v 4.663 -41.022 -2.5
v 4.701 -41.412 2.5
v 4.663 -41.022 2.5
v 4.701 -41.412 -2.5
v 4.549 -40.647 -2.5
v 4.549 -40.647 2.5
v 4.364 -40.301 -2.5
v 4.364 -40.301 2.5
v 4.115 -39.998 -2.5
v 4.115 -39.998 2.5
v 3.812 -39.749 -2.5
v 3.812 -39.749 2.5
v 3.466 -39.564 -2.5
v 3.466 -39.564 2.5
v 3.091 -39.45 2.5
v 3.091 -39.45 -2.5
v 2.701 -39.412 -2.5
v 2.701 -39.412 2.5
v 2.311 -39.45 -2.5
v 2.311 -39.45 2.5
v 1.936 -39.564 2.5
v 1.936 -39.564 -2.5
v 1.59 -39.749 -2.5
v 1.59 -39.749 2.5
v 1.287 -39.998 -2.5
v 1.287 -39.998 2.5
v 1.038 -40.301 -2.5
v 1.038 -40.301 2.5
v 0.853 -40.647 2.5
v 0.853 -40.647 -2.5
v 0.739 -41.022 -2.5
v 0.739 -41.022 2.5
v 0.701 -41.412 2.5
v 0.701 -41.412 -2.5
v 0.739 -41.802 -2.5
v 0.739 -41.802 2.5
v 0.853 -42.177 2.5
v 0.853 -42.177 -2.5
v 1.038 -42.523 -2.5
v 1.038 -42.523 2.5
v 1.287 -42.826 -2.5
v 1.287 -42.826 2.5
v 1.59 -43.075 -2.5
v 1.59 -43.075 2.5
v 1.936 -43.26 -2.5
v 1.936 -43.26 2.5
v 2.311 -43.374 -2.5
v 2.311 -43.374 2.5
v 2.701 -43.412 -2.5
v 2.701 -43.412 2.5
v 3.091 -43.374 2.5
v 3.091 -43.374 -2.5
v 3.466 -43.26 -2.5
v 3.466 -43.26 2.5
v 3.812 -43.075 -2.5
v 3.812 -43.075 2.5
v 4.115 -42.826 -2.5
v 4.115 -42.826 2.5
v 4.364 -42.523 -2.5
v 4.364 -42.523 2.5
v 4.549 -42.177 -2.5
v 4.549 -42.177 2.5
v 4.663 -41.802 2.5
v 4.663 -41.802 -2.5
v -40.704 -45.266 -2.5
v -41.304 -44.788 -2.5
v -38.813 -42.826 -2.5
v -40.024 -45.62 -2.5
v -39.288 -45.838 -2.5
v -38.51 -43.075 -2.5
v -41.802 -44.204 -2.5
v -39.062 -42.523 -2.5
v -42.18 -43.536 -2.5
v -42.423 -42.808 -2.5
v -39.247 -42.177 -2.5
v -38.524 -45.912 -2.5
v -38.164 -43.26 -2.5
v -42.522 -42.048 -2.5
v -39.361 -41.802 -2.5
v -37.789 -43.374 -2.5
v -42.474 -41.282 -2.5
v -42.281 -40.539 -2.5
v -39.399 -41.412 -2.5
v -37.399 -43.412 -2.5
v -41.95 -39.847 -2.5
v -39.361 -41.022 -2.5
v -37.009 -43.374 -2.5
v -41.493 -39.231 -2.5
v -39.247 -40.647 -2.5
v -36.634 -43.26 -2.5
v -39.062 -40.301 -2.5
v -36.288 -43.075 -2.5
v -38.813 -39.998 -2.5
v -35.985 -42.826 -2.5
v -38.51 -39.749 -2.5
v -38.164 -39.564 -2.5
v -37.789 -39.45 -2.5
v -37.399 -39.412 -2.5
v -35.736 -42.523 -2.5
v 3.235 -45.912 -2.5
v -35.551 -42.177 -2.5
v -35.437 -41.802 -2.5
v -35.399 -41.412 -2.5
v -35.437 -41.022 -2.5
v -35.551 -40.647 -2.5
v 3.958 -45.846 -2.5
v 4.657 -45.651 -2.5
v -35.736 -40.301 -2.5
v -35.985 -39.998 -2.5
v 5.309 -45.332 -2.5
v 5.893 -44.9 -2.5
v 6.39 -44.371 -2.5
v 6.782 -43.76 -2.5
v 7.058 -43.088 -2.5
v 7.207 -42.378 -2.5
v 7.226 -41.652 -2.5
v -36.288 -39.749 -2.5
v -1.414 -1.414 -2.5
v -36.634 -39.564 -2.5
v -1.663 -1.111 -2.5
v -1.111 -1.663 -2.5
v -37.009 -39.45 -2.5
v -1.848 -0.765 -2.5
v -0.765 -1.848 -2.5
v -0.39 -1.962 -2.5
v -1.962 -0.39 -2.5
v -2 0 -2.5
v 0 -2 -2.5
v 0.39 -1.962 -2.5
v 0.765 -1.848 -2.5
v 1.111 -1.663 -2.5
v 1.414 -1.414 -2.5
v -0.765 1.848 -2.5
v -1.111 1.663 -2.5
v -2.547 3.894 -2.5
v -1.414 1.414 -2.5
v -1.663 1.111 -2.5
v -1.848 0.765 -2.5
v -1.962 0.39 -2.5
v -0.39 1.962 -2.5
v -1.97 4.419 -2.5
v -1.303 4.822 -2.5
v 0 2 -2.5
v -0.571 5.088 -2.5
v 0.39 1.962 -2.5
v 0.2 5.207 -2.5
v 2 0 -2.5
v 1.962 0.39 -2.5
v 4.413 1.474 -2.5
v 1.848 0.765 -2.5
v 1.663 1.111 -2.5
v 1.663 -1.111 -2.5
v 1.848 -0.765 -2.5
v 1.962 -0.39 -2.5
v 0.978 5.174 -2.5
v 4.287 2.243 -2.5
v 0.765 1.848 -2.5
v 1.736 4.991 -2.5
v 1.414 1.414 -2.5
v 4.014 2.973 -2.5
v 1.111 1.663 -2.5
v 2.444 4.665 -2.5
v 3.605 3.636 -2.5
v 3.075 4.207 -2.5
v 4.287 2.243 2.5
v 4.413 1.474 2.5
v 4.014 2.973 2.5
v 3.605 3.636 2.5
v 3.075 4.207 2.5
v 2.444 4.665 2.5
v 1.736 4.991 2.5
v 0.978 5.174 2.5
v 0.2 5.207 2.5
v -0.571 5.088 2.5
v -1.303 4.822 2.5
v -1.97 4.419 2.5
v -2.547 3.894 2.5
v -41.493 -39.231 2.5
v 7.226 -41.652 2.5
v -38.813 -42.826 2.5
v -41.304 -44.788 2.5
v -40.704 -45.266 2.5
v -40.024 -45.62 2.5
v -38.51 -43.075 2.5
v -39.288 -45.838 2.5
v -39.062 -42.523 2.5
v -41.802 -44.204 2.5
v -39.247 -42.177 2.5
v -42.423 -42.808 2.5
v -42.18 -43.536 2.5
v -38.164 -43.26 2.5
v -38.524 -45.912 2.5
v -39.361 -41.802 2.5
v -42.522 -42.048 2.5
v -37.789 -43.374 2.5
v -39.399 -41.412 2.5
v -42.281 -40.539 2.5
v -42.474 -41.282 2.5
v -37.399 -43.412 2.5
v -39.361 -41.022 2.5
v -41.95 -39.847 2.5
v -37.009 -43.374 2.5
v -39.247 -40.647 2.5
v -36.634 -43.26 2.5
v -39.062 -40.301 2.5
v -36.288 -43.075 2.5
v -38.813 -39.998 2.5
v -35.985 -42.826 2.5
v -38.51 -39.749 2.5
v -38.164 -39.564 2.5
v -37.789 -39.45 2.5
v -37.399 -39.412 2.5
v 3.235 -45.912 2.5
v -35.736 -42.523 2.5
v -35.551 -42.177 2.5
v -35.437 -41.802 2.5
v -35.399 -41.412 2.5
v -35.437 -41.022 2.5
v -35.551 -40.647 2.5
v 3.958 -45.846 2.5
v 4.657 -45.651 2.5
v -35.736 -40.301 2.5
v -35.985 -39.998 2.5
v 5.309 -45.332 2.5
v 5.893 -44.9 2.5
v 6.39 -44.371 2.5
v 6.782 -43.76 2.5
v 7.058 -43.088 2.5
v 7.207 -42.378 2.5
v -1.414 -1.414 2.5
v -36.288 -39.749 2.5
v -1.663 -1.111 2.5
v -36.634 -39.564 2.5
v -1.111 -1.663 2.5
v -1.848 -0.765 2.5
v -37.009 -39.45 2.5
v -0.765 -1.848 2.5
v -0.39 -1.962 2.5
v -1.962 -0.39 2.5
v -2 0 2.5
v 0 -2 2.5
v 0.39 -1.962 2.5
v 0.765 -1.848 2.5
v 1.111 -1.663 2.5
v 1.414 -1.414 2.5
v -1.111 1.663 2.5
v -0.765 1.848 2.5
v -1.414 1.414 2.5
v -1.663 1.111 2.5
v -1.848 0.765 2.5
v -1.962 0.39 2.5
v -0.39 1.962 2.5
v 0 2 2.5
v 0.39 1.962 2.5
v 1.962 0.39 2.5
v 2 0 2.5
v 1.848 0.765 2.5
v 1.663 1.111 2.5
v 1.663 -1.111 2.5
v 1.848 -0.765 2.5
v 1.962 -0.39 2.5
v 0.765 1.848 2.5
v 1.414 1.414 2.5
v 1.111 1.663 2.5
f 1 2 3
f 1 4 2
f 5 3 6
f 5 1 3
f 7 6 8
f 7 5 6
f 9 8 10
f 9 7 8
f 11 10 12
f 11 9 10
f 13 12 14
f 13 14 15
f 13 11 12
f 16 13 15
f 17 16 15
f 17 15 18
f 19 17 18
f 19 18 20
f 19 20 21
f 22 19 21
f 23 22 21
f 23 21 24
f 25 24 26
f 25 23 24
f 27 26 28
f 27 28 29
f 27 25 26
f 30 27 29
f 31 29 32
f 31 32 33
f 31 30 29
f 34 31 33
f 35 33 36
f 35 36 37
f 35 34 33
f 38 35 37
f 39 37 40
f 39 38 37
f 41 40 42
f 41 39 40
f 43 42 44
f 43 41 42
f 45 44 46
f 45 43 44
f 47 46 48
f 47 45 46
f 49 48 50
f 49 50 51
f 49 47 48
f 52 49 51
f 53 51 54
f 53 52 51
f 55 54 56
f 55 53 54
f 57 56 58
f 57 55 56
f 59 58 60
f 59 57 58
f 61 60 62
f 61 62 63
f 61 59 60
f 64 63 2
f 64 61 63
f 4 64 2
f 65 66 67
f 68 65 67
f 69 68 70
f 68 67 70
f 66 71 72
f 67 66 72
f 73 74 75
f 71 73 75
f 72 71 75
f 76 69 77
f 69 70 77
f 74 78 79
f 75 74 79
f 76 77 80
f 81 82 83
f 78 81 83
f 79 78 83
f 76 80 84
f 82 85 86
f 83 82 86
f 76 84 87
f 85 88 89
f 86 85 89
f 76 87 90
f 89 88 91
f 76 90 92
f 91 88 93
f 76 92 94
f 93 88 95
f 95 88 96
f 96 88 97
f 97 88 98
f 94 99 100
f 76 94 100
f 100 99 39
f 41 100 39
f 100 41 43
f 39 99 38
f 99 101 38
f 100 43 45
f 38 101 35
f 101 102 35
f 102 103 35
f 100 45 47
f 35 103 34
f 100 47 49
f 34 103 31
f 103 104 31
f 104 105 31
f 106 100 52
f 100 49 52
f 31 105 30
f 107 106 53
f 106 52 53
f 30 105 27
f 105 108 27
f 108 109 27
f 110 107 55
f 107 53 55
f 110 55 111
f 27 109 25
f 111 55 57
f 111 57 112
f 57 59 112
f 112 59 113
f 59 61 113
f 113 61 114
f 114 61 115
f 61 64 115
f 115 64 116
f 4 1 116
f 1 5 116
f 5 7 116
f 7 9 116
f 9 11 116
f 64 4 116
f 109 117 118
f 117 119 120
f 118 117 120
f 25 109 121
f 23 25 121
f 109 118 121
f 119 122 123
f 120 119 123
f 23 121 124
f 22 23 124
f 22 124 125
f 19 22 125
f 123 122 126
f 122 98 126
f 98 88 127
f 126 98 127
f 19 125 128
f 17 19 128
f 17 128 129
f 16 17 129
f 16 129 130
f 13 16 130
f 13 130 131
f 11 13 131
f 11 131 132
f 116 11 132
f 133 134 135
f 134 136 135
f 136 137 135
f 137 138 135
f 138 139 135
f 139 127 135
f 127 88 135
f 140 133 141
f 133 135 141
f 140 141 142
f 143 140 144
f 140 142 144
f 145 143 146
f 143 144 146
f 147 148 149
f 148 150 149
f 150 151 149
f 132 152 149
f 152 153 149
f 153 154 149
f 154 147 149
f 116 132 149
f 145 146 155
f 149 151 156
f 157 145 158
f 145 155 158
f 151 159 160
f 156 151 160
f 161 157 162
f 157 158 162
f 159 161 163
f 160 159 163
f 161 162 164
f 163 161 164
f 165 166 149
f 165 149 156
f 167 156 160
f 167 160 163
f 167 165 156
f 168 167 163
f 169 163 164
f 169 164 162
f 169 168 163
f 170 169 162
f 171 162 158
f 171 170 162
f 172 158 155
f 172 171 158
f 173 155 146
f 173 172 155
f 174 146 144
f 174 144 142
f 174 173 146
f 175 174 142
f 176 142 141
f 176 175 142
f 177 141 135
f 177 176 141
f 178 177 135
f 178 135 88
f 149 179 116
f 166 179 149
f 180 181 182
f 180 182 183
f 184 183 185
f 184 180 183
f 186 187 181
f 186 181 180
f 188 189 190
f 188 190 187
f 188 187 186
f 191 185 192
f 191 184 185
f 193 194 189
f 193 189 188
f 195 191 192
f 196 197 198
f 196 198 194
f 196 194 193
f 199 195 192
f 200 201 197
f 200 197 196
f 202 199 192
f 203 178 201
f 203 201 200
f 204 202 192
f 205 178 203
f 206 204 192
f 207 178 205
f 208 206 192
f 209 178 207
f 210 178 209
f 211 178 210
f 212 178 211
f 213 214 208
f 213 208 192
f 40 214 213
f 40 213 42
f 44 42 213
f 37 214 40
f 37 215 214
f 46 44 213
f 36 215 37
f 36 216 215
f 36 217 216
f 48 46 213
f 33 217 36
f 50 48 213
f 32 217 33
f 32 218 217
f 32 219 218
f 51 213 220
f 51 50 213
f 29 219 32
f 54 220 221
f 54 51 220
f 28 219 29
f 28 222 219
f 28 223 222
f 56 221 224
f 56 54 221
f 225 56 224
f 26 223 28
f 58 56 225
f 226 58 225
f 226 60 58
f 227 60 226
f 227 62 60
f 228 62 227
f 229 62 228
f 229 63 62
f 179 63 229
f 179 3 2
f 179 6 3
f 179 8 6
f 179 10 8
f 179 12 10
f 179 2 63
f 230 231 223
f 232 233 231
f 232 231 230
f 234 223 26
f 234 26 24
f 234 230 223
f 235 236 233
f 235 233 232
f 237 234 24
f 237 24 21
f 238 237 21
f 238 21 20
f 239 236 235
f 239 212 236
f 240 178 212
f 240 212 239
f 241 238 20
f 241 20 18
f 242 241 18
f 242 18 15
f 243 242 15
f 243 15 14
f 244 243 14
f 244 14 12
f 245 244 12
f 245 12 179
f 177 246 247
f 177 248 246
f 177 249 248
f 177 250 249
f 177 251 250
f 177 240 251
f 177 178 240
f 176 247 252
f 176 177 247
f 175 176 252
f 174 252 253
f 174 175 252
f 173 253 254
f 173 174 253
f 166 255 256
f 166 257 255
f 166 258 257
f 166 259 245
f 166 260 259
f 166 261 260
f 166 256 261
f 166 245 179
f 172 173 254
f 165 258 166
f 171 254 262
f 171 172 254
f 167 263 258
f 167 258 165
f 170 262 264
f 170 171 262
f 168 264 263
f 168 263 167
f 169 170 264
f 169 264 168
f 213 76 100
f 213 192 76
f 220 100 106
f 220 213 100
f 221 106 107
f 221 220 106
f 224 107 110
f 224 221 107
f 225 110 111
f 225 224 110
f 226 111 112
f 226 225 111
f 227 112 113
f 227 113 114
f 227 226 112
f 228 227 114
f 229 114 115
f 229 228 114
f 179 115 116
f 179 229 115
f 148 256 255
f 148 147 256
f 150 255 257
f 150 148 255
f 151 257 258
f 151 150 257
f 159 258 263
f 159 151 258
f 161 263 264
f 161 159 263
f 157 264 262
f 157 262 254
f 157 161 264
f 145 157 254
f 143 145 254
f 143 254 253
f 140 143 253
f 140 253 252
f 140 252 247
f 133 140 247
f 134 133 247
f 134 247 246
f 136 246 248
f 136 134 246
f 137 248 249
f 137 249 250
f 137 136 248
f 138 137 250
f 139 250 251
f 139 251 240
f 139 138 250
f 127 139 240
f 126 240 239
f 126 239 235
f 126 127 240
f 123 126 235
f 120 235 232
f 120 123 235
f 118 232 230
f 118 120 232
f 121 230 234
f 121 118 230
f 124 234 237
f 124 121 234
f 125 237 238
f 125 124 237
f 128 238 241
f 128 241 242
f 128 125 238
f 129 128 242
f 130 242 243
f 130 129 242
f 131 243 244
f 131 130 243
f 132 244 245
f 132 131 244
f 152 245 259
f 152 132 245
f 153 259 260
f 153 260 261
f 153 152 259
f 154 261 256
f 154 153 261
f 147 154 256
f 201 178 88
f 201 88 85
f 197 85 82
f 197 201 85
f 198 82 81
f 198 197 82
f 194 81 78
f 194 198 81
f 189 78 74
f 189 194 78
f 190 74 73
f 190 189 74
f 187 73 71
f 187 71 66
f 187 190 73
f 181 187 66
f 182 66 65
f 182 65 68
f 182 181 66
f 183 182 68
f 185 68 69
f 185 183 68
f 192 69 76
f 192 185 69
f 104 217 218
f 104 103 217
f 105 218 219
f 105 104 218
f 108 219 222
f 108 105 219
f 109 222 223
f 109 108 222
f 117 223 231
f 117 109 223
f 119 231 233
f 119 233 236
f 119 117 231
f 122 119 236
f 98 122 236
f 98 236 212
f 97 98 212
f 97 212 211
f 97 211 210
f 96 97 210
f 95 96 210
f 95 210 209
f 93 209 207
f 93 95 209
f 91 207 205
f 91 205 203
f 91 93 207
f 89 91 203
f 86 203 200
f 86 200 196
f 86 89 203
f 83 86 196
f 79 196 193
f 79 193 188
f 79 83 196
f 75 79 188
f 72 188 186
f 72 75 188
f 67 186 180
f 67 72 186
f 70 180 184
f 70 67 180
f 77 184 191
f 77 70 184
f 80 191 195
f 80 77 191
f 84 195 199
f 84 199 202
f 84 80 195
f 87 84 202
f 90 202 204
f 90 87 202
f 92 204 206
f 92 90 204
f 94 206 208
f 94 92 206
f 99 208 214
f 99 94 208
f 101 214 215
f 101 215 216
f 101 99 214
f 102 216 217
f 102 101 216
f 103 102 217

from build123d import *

# Parameters (mm, degrees)
SKETCH_2_R      = 2
EXTRUDE_1_DEPTH = 2.5


with BuildPart() as part:
    # 草圖2 → 填料-伸長1 (new, symmetric)
    with BuildSketch(Plane.XY):
        with BuildLine():
            Line((7.226190238, -41.651673377), (4.413452329, 1.473554067))
            ThreePointArc((4.413452329, 1.473554067), (1.735862232, 4.991257537), (-2.546669656, 3.894149036))
            Line((-2.546669656, 3.894149036), (-41.492870765, -39.231078407))
            ThreePointArc((-41.492870765, -39.231078407), (-42.179656235, -43.536244411), (-38.524267862, -45.912010486))
            Line((-38.524267862, -45.912010486), (3.234671155, -45.912010486))
            ThreePointArc((3.234671155, -45.912010486), (6.153690549, -44.64684609), (7.226190238, -41.651673377))
        make_face()
        Circle(SKETCH_2_R, mode=Mode.SUBTRACT)
        with Locations((2.700997506, -41.412010486)):
            Circle(SKETCH_2_R, mode=Mode.SUBTRACT)
        with Locations((-37.399002494, -41.412010486)):
            Circle(SKETCH_2_R, mode=Mode.SUBTRACT)
    extrude(amount=EXTRUDE_1_DEPTH, both=True)


solid = part.part
